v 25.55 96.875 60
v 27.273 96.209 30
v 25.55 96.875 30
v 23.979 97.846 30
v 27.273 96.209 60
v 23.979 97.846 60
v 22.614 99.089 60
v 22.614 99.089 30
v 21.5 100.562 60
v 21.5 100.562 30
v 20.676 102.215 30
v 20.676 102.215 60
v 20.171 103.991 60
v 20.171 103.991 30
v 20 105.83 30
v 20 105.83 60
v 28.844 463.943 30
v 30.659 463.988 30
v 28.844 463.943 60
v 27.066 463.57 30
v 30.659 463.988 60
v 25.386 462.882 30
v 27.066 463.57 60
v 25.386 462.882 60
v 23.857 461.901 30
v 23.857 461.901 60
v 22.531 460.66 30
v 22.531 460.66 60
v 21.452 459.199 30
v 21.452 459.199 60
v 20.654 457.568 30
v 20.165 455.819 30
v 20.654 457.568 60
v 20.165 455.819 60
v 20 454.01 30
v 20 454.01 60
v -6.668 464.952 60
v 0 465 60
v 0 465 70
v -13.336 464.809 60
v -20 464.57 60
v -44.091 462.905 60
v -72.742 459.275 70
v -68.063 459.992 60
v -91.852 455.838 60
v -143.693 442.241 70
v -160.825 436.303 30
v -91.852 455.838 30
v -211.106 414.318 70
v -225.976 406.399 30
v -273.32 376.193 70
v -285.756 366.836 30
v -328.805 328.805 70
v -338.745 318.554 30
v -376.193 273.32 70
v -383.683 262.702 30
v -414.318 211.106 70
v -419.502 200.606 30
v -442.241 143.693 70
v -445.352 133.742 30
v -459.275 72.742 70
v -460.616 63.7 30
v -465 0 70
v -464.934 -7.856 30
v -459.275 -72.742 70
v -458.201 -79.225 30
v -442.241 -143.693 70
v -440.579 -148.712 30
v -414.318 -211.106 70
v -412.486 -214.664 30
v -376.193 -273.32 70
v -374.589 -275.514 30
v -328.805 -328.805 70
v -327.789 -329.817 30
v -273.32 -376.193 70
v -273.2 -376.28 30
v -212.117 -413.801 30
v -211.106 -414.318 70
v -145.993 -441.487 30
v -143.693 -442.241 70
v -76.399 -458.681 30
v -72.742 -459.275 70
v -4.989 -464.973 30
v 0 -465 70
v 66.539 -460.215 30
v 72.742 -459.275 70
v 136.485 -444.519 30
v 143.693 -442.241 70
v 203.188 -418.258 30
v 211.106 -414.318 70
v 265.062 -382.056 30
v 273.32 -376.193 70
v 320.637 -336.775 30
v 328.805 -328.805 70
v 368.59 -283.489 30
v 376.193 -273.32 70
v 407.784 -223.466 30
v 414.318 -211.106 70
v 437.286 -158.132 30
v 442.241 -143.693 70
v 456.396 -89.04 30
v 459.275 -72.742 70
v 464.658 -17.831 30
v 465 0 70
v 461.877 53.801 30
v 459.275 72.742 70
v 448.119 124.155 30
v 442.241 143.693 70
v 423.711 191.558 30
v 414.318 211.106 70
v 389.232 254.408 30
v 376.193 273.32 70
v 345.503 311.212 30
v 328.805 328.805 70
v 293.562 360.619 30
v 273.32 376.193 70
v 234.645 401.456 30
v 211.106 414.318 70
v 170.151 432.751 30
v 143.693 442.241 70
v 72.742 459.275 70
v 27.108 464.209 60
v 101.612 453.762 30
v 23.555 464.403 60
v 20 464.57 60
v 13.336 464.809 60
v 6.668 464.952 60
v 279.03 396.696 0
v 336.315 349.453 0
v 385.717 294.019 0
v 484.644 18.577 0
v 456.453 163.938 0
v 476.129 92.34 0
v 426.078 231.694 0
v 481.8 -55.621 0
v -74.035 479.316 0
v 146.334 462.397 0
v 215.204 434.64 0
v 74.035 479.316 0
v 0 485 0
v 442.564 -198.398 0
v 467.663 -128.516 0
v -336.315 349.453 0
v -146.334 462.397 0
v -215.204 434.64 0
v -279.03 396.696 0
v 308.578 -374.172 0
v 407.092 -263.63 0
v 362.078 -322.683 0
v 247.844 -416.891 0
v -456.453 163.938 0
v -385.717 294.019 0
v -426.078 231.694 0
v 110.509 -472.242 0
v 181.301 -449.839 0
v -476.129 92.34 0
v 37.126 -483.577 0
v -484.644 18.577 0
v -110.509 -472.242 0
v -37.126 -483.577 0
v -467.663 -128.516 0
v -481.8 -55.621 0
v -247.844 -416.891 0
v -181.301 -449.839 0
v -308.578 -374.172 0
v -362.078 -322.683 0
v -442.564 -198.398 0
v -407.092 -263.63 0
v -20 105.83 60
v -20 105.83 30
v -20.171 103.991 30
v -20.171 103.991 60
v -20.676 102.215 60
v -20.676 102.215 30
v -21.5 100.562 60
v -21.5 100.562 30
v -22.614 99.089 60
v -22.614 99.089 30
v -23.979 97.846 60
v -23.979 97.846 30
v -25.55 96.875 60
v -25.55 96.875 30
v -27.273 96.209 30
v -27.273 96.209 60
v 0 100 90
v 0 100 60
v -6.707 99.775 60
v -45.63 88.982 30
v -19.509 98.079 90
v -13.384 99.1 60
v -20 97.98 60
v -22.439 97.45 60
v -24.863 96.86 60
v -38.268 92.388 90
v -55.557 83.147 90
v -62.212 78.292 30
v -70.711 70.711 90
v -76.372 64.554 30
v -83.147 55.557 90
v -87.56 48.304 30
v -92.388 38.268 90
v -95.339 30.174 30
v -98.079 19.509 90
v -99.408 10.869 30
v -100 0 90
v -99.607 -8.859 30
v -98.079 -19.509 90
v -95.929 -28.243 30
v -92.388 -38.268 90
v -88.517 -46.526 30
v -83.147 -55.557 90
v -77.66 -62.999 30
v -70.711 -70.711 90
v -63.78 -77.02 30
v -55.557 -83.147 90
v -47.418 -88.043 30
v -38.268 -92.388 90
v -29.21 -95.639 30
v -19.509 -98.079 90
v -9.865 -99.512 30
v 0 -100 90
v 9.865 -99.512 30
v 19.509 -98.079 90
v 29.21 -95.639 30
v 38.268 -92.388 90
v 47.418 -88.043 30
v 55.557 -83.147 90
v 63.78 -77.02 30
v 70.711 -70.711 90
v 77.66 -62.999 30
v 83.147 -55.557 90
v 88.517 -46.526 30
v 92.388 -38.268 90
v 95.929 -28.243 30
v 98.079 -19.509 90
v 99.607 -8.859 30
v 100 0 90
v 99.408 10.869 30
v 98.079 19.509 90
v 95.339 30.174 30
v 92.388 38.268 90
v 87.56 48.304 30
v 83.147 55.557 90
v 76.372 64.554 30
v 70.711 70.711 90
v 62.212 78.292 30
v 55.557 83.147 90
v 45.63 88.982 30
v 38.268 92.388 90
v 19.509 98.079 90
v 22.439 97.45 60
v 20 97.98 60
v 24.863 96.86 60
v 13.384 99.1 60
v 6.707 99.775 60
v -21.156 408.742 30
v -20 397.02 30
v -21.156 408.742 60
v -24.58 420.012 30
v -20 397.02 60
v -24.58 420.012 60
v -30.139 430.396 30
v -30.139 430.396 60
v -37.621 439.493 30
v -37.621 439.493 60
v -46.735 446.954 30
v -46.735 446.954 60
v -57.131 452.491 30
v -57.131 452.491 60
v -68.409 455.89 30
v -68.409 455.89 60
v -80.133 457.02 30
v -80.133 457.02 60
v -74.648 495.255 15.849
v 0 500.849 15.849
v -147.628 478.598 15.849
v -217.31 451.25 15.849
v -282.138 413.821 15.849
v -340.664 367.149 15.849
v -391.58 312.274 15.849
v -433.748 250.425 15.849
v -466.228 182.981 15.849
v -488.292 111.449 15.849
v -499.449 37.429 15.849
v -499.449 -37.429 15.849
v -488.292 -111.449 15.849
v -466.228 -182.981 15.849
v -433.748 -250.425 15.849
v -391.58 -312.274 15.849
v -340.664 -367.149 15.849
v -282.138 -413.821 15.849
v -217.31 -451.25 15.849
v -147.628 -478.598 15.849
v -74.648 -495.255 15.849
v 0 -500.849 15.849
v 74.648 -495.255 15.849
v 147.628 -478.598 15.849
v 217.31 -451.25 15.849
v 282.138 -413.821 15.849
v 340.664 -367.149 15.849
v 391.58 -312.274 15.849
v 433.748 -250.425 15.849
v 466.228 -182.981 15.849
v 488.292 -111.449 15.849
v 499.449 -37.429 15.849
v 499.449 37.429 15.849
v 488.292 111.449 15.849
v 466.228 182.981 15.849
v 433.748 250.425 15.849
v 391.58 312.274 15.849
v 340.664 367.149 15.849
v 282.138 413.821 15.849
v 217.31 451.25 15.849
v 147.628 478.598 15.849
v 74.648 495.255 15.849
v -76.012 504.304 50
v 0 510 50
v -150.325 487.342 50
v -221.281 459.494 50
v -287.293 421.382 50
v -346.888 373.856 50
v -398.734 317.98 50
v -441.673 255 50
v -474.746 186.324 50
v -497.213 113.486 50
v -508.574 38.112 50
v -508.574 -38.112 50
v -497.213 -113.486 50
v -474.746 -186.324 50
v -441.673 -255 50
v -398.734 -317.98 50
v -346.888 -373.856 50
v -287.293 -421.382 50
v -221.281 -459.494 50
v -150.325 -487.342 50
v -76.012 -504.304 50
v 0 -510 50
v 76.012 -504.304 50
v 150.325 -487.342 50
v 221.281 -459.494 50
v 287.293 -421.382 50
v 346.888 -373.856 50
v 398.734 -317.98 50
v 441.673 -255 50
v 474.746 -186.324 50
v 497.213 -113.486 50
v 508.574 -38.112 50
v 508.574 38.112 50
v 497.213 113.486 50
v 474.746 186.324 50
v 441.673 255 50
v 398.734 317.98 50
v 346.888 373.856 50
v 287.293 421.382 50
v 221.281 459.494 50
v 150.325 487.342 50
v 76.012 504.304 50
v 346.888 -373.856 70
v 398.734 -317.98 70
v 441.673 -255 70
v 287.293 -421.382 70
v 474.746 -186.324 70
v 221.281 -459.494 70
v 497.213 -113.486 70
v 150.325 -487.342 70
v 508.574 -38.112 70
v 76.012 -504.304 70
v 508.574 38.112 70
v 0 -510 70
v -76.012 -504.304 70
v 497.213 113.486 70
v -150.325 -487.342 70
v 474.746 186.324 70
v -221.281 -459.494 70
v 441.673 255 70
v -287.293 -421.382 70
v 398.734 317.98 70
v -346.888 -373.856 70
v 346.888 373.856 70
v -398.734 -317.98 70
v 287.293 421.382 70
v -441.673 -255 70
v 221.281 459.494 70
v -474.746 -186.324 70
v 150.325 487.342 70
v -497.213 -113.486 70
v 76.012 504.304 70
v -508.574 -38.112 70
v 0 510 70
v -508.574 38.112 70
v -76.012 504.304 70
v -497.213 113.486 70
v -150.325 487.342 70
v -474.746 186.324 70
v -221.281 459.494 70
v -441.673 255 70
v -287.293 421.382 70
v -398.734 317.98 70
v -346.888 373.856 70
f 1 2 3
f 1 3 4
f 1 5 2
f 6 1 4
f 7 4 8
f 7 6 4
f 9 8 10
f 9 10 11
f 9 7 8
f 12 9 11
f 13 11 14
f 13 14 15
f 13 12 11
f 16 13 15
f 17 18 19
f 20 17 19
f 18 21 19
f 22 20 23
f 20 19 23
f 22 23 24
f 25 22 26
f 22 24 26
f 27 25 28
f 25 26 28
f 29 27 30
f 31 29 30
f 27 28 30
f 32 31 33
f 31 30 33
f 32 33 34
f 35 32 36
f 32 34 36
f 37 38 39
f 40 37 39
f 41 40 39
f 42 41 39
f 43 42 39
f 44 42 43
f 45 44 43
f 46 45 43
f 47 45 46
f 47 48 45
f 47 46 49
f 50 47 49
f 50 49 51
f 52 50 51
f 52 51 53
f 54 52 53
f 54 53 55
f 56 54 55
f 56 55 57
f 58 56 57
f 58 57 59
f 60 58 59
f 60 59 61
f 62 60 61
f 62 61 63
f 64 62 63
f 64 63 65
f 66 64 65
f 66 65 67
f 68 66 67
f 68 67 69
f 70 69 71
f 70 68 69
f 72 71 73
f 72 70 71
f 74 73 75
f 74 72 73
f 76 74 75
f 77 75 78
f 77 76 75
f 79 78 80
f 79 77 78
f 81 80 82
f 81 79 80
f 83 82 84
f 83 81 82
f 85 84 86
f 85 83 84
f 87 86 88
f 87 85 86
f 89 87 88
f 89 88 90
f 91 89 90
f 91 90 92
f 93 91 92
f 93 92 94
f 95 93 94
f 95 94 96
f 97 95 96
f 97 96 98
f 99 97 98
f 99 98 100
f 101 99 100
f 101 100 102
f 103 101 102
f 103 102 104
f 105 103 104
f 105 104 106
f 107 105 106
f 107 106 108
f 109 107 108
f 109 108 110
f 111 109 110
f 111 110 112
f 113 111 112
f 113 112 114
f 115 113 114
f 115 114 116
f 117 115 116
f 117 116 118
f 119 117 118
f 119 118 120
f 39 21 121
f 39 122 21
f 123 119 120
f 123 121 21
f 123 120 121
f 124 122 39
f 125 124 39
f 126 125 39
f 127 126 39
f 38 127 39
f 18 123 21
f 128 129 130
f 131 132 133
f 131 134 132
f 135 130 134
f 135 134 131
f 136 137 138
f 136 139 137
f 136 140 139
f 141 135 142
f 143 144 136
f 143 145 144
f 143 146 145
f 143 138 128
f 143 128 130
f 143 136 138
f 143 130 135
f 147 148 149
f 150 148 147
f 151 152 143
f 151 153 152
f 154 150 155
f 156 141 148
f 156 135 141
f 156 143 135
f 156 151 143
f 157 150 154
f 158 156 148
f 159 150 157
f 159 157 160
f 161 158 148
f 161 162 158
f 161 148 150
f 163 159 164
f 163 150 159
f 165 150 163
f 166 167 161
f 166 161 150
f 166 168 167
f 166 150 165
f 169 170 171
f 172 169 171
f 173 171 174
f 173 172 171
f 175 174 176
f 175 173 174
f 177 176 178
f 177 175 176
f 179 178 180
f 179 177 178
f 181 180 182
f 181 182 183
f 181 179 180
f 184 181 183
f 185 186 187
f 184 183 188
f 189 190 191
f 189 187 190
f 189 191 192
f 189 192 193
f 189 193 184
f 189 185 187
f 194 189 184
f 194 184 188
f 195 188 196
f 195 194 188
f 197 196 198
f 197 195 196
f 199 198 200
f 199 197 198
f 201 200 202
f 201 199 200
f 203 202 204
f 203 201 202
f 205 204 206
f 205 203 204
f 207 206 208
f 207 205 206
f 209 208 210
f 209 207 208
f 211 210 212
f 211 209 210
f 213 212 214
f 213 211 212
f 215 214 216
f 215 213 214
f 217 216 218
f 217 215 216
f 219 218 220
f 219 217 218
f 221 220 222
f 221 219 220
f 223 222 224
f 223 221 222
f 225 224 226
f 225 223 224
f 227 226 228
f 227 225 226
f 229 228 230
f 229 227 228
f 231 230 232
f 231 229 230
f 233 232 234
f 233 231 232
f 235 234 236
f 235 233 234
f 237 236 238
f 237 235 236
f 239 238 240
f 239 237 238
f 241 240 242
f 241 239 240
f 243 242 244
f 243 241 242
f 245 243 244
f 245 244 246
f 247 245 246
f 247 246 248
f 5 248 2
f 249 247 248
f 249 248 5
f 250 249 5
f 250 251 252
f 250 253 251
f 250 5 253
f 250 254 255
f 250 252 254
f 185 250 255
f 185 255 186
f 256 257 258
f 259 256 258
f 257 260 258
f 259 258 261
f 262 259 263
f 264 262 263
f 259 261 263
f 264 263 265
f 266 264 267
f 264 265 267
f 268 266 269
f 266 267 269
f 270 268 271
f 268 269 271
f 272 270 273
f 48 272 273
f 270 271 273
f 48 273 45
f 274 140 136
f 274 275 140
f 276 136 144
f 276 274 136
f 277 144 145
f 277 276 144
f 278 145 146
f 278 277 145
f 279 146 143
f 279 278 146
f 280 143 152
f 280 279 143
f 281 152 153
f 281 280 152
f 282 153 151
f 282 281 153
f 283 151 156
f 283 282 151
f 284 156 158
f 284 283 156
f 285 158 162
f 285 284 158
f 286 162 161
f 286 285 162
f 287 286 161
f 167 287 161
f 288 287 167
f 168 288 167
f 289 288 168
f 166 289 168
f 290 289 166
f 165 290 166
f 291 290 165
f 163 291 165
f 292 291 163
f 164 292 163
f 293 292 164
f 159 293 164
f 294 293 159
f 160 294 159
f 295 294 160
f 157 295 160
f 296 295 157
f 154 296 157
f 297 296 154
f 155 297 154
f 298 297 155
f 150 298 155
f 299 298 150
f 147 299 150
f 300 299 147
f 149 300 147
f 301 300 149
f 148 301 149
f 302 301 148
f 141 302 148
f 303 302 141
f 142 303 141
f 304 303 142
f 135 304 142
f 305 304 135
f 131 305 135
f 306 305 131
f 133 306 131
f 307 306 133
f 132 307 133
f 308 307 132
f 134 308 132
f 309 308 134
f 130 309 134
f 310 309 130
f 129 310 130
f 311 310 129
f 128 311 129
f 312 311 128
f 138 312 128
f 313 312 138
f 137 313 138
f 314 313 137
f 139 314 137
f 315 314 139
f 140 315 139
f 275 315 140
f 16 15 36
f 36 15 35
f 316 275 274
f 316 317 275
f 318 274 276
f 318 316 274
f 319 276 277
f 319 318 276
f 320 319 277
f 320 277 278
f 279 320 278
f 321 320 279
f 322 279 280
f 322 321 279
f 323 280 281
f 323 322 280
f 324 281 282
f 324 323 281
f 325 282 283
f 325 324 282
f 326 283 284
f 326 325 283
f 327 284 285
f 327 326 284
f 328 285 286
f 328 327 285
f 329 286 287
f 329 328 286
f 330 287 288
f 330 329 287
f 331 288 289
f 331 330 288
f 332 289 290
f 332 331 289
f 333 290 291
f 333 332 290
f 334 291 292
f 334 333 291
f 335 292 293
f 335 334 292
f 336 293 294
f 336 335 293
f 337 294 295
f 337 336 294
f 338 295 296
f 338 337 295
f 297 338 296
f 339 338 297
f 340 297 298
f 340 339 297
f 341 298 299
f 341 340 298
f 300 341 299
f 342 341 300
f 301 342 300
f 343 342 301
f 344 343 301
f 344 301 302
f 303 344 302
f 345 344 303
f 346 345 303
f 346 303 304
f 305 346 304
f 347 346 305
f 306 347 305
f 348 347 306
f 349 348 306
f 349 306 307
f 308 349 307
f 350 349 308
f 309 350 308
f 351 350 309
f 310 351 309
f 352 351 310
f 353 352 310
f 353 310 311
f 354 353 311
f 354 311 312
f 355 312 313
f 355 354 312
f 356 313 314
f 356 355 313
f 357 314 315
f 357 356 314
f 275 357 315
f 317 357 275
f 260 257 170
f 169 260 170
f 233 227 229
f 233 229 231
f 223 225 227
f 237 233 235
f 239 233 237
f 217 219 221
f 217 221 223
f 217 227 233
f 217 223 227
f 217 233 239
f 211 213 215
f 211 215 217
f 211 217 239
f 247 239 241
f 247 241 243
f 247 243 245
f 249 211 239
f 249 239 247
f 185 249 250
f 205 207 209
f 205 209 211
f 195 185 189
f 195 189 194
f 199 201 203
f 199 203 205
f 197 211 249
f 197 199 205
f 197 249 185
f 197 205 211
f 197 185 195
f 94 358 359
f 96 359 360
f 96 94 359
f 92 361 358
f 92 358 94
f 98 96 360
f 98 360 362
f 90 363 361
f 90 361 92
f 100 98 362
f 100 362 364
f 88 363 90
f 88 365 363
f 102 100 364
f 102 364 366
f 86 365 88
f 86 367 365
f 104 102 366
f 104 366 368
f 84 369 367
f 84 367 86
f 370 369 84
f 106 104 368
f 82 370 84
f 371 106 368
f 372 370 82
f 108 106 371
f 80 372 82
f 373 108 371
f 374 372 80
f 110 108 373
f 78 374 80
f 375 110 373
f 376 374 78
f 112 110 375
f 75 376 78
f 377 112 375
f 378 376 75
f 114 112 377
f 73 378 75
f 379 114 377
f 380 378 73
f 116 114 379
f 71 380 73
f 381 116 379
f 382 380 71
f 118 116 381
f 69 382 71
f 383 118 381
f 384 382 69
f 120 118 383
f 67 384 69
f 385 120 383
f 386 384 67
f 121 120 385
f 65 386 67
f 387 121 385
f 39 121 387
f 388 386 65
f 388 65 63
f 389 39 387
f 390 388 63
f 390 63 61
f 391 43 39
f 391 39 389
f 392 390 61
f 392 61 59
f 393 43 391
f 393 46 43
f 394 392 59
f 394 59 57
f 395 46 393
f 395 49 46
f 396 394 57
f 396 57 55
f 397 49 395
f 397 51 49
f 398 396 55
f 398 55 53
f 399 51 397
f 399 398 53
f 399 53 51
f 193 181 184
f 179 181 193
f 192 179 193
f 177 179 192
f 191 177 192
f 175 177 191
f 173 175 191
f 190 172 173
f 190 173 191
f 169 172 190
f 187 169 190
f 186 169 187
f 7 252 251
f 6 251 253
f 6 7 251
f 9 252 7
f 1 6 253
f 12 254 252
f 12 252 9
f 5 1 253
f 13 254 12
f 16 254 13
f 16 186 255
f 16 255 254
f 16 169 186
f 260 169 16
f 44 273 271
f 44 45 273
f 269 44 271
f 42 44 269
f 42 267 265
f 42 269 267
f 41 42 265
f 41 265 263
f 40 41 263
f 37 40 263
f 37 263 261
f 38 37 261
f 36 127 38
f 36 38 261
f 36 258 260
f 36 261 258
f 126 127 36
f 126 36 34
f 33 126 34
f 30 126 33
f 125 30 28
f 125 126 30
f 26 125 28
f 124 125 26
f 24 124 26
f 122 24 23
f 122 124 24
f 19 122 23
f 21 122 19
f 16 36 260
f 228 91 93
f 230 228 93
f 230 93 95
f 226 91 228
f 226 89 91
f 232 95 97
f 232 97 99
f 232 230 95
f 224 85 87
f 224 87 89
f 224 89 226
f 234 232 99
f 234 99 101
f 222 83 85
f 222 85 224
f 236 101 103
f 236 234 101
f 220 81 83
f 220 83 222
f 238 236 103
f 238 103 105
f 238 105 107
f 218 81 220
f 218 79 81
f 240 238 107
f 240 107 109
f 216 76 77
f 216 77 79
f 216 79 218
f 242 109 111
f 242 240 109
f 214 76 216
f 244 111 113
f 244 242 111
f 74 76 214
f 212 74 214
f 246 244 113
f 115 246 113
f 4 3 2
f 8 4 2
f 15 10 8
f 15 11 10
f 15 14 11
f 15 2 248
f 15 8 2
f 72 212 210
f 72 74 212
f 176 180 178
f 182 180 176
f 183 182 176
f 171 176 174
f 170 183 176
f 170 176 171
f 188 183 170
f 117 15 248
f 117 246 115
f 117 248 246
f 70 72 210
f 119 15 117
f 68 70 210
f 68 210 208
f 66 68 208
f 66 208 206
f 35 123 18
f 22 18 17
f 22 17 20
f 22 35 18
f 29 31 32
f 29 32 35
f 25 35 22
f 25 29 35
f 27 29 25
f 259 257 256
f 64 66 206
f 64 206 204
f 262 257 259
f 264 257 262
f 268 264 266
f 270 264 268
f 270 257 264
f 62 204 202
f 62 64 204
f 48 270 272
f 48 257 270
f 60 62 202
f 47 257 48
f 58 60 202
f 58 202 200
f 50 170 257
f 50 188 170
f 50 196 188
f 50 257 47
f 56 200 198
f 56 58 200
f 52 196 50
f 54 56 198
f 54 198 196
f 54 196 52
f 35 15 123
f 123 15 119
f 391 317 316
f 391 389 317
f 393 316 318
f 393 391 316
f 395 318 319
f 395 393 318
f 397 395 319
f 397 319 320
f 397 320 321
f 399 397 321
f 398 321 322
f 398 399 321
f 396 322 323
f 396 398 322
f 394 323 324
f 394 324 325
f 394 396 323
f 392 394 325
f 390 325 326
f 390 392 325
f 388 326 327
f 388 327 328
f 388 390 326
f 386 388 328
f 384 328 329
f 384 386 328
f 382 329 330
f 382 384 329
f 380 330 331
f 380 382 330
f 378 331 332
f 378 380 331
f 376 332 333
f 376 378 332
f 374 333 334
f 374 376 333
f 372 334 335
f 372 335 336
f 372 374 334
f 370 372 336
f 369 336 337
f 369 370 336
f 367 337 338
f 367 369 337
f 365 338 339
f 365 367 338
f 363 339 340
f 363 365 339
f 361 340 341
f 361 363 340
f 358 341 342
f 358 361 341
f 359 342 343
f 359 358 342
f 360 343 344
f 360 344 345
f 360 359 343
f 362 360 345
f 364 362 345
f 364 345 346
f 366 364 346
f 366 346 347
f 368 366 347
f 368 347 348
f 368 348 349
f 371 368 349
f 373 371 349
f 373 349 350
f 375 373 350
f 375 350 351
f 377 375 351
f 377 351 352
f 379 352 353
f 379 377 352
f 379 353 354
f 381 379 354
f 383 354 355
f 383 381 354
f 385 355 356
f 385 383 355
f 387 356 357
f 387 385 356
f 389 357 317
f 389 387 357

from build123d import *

# Parameters (mm, degrees)
BOSS_EXTRUDE1_DEPTH = 30
FILLET1_R           = 60
FILLET2_R           = 10


with BuildPart() as part:
    # Sketch1 → Revolve1 (revolve)
    with BuildSketch(Plane(origin=(0, 0, 0), x_dir=(0, 0, -1), z_dir=(1, 0, 0))):
        Polygon((0, 0), (0, 485), (-15.849364905, 500.849364905), (-50, 510), (-70, 510), (-70, 465), (-30, 465), (-30, 100), (-90, 100), (-90, 0), (-30, 0), align=None)
    revolve(axis=Axis((0, 0, 0), (0, 0, 1)))

    # Sketch2 → Boss-Extrude1 (add)
    with BuildSketch(Plane.XY.offset(30)):
        with BuildLine():
            Line((-20, 464.569693372), (-20, 97.979589711))
            ThreePointArc((-20, 97.979589711), (0, 100), (20, 97.979589711))
            Line((20, 97.979589711), (20, 464.569693372))
            ThreePointArc((20, 464.569693372), (0, 465), (-20, 464.569693372))
        make_face()
    extrude(amount=BOSS_EXTRUDE1_DEPTH)

    # Fillet1
    fillet1_edges = [part.edges().sort_by_distance(p)[0] for p in [
        (-20, 464.569693372, 45),
    ]]
    fillet(fillet1_edges, radius=FILLET1_R)

    # Fillet2
    fillet2_edges = [part.edges().sort_by_distance(p)[0] for p in [
        (20, 464.569693372, 45),
        (-20, 97.979589711, 45),
        (20, 97.979589711, 45),
    ]]
    fillet(fillet2_edges, radius=FILLET2_R)


solid = part.part
